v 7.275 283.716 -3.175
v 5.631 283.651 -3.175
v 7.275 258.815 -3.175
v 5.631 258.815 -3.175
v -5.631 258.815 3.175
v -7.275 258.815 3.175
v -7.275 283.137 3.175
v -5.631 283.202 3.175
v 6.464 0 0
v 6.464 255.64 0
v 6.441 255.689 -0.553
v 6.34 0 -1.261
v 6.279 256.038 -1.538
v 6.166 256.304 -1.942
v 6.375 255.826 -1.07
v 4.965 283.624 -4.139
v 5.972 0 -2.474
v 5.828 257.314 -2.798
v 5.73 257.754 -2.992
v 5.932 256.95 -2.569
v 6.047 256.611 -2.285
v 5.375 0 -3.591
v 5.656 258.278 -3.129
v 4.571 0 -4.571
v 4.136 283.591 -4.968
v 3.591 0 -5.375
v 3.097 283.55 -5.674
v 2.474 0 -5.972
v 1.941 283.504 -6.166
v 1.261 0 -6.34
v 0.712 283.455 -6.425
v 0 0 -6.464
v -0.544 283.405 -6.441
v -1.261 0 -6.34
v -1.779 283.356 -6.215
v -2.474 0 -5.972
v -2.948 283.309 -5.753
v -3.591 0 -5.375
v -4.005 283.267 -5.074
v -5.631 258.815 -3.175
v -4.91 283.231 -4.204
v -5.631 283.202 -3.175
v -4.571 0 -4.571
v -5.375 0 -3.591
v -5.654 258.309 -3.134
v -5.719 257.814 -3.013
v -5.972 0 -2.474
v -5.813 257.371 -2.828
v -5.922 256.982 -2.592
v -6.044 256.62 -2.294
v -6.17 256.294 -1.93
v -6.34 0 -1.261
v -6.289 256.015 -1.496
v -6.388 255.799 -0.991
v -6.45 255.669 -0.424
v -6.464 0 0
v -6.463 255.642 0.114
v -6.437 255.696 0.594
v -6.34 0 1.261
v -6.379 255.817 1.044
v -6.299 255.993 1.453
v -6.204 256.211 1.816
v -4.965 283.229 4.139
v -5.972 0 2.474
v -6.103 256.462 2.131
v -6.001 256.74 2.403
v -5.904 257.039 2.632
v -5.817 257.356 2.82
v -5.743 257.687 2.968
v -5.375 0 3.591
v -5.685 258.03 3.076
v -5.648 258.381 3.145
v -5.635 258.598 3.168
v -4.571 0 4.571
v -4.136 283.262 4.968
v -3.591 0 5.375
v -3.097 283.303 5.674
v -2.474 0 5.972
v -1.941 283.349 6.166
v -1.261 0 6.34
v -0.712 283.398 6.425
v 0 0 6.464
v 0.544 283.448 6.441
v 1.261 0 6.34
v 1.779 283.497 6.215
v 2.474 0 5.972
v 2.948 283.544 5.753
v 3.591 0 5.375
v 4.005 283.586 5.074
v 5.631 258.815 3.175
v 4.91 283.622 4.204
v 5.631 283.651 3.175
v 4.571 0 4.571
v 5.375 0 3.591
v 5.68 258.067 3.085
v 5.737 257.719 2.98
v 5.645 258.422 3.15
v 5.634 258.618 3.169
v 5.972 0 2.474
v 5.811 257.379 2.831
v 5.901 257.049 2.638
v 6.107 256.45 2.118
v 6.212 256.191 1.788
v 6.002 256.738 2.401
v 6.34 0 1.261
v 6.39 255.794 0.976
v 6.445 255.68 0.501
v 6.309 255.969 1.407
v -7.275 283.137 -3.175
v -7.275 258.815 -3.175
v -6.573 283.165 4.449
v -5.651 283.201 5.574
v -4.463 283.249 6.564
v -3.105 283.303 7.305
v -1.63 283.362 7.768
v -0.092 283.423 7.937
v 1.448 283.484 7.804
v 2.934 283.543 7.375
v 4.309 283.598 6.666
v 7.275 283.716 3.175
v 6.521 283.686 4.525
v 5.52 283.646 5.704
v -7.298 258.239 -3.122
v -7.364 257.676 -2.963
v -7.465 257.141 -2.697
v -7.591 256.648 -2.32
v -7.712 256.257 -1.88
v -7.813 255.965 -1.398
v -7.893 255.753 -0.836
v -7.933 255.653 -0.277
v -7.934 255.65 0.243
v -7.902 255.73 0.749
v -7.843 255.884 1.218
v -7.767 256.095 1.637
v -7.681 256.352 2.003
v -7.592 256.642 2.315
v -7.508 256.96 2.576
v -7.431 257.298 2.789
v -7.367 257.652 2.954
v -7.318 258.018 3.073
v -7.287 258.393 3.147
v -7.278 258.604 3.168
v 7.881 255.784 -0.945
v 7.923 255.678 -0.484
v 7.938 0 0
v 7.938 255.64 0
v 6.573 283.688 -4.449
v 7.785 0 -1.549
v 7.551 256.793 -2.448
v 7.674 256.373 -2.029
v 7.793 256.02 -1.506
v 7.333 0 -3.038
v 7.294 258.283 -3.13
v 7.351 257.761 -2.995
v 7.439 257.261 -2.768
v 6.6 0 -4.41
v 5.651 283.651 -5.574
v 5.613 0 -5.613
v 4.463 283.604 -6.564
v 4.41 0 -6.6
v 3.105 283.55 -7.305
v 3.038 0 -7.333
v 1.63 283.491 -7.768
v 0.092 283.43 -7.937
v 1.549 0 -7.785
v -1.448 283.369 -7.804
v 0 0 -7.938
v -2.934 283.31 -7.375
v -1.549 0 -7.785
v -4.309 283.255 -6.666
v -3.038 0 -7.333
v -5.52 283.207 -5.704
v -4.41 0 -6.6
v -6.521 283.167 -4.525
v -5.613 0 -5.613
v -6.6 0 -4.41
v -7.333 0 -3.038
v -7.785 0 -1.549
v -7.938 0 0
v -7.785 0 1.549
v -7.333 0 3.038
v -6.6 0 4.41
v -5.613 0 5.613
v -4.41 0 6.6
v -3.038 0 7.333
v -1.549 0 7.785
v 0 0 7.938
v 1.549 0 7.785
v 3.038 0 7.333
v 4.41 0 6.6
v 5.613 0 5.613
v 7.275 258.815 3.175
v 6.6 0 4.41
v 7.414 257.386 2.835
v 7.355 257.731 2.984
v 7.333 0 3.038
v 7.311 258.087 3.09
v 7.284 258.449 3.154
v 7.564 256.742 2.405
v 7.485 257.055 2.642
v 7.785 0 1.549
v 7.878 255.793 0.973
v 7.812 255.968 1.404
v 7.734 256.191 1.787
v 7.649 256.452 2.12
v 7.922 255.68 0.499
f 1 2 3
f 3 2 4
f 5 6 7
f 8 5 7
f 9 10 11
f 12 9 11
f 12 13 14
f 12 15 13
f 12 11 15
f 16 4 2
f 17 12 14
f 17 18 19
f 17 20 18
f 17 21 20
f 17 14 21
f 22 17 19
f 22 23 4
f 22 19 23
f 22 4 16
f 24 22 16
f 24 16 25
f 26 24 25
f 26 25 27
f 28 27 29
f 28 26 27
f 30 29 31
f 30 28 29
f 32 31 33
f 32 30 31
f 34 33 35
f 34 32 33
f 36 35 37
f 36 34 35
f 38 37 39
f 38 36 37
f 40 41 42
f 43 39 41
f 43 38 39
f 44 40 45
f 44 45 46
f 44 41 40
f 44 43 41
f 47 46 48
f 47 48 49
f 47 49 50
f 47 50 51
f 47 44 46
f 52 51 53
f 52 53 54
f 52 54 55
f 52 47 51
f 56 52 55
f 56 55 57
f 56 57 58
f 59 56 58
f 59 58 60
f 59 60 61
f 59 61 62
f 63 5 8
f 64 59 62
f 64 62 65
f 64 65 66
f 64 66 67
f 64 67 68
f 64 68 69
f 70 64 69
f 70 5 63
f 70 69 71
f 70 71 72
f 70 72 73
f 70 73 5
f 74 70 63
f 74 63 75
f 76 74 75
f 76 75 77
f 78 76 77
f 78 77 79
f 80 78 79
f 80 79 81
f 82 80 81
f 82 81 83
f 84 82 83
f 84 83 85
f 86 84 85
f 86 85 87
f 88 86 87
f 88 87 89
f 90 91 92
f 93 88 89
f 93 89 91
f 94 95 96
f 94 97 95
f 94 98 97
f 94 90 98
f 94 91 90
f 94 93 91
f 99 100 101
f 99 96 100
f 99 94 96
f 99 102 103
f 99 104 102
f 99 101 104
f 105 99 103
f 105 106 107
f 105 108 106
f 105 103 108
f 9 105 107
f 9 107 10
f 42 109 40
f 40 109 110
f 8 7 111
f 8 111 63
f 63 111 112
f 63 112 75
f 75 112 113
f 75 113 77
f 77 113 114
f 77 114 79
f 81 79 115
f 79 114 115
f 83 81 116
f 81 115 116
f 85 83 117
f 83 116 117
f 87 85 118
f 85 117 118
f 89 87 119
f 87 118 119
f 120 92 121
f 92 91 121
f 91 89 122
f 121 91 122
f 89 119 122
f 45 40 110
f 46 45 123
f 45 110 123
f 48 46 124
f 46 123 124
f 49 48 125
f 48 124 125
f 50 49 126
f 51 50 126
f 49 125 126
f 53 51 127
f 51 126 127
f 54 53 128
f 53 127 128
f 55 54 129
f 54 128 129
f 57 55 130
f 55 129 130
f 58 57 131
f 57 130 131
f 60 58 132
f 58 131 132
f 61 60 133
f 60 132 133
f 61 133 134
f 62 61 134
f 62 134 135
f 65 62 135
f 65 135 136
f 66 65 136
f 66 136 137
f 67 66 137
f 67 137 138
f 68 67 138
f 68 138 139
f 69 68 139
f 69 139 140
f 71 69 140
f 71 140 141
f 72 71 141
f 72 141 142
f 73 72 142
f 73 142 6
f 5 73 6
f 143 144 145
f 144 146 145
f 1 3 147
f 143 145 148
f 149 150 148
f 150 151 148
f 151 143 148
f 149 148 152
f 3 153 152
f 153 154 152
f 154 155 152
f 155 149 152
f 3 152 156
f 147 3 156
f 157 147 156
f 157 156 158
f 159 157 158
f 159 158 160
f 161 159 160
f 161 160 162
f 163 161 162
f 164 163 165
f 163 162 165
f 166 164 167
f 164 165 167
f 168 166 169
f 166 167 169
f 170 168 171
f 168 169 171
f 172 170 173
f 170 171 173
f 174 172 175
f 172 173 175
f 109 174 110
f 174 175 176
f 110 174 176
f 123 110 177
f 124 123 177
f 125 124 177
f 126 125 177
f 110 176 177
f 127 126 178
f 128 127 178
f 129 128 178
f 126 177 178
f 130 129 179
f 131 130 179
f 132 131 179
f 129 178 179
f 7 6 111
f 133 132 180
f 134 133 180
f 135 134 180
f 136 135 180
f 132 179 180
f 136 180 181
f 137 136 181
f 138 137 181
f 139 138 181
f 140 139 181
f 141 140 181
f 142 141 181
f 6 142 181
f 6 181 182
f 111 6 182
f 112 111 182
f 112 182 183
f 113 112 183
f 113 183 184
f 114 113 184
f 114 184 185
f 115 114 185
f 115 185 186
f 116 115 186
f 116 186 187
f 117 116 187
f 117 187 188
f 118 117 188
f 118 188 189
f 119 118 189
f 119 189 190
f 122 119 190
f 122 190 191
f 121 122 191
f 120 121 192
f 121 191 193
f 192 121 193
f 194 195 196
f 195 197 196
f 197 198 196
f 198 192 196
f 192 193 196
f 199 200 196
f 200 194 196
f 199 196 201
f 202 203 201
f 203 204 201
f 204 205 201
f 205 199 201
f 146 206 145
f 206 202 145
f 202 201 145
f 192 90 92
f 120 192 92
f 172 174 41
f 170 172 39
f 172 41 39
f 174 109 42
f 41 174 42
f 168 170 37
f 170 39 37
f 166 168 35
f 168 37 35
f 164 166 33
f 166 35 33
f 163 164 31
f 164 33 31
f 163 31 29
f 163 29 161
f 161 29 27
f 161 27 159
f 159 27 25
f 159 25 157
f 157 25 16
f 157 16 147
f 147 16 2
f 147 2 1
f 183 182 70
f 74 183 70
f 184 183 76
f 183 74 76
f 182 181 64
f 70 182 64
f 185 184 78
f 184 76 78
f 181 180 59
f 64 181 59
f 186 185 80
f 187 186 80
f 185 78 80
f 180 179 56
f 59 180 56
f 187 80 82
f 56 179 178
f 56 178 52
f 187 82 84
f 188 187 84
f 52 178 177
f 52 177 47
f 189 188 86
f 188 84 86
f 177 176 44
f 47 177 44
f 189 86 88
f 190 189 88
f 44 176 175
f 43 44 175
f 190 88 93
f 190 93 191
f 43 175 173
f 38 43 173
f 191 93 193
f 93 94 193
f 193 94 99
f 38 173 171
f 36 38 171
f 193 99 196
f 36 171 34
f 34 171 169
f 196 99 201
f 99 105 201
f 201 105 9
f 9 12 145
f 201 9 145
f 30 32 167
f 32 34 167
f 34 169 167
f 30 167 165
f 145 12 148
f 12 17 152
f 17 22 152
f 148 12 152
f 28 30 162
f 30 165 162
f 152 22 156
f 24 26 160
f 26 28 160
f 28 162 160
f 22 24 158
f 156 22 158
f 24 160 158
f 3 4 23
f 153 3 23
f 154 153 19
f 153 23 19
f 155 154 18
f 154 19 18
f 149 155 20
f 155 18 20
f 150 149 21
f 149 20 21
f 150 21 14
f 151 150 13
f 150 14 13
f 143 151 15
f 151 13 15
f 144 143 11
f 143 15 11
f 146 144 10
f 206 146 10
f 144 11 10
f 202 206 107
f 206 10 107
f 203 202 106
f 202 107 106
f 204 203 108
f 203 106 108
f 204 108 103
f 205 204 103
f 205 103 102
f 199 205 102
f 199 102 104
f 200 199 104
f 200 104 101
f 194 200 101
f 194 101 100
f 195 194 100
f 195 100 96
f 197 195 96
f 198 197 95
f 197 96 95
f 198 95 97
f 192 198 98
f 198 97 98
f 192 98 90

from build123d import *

# Parameters (mm, degrees)
BOSS_EXTRUDE1_OUTLINE_R   = 7.9375
BOSS_EXTRUDE1_OUTLINE_R_2 = 6.4643
BOSS_EXTRUDE1_DEPTH       = 283.742530581
BOSS_EXTRUDE1_START       = -285
BOSS_EXTRUDE1_2_OUTLINE_W = 19
BOSS_EXTRUDE1_2_OUTLINE_H = 18
BOSS_EXTRUDE1_2_DEPTH     = 1.798021877
CUT_EXTRUDE1_DEPTH        = 9.525
CUT_EXTRUDE1_DEPTH_BACK   = 9.525


with BuildPart() as part:
    # Boss-Extrude1: read off the stored shape, not the designer's step
    # Boss-Extrude1 outline → Boss-Extrude1 (new body)
    with BuildSketch(Plane(origin=(0, 0, 0), x_dir=(1, 0, 0), z_dir=(0, 1, 0))):
        Circle(BOSS_EXTRUDE1_OUTLINE_R)
        Circle(BOSS_EXTRUDE1_OUTLINE_R_2, mode=Mode.SUBTRACT)
    extrude(amount=BOSS_EXTRUDE1_DEPTH)

    # Boss-Extrude1 2 outline → Boss-Extrude1 2 (cut)
    with BuildSketch(Plane(origin=(0, 0, 0), x_dir=(0.9992080363952592, 0.039790702470935205, 0), z_dir=(0.039790702470935205, -0.9992080363952592, 0)).offset(BOSS_EXTRUDE1_START)):
        with Locations((11.5, 0)):
            Rectangle(BOSS_EXTRUDE1_2_OUTLINE_W, BOSS_EXTRUDE1_2_OUTLINE_H)
    extrude(amount=BOSS_EXTRUDE1_2_DEPTH, mode=Mode.SUBTRACT)

    # Sketch2 → Cut-Extrude1 (cut, two sides: drawn at the far end of the back side and taken through both)
    with BuildSketch(Plane(origin=(0, 0, 0), x_dir=(0, 0, -1), z_dir=(1, 0, 0)).offset(-CUT_EXTRUDE1_DEPTH_BACK)):
        with BuildLine():
            Line((3.175, 284.215449167), (3.175, 258.815449167))
            ThreePointArc((3.175, 258.815449167), (0, 255.640449167), (-3.175, 258.815449167))
            Line((-3.175, 258.815449167), (-3.175, 284.215449167))
            Line((-3.175, 284.215449167), (3.175, 284.215449167))
        make_face()
    extrude(amount=CUT_EXTRUDE1_DEPTH + CUT_EXTRUDE1_DEPTH_BACK, mode=Mode.SUBTRACT)


solid = part.part
